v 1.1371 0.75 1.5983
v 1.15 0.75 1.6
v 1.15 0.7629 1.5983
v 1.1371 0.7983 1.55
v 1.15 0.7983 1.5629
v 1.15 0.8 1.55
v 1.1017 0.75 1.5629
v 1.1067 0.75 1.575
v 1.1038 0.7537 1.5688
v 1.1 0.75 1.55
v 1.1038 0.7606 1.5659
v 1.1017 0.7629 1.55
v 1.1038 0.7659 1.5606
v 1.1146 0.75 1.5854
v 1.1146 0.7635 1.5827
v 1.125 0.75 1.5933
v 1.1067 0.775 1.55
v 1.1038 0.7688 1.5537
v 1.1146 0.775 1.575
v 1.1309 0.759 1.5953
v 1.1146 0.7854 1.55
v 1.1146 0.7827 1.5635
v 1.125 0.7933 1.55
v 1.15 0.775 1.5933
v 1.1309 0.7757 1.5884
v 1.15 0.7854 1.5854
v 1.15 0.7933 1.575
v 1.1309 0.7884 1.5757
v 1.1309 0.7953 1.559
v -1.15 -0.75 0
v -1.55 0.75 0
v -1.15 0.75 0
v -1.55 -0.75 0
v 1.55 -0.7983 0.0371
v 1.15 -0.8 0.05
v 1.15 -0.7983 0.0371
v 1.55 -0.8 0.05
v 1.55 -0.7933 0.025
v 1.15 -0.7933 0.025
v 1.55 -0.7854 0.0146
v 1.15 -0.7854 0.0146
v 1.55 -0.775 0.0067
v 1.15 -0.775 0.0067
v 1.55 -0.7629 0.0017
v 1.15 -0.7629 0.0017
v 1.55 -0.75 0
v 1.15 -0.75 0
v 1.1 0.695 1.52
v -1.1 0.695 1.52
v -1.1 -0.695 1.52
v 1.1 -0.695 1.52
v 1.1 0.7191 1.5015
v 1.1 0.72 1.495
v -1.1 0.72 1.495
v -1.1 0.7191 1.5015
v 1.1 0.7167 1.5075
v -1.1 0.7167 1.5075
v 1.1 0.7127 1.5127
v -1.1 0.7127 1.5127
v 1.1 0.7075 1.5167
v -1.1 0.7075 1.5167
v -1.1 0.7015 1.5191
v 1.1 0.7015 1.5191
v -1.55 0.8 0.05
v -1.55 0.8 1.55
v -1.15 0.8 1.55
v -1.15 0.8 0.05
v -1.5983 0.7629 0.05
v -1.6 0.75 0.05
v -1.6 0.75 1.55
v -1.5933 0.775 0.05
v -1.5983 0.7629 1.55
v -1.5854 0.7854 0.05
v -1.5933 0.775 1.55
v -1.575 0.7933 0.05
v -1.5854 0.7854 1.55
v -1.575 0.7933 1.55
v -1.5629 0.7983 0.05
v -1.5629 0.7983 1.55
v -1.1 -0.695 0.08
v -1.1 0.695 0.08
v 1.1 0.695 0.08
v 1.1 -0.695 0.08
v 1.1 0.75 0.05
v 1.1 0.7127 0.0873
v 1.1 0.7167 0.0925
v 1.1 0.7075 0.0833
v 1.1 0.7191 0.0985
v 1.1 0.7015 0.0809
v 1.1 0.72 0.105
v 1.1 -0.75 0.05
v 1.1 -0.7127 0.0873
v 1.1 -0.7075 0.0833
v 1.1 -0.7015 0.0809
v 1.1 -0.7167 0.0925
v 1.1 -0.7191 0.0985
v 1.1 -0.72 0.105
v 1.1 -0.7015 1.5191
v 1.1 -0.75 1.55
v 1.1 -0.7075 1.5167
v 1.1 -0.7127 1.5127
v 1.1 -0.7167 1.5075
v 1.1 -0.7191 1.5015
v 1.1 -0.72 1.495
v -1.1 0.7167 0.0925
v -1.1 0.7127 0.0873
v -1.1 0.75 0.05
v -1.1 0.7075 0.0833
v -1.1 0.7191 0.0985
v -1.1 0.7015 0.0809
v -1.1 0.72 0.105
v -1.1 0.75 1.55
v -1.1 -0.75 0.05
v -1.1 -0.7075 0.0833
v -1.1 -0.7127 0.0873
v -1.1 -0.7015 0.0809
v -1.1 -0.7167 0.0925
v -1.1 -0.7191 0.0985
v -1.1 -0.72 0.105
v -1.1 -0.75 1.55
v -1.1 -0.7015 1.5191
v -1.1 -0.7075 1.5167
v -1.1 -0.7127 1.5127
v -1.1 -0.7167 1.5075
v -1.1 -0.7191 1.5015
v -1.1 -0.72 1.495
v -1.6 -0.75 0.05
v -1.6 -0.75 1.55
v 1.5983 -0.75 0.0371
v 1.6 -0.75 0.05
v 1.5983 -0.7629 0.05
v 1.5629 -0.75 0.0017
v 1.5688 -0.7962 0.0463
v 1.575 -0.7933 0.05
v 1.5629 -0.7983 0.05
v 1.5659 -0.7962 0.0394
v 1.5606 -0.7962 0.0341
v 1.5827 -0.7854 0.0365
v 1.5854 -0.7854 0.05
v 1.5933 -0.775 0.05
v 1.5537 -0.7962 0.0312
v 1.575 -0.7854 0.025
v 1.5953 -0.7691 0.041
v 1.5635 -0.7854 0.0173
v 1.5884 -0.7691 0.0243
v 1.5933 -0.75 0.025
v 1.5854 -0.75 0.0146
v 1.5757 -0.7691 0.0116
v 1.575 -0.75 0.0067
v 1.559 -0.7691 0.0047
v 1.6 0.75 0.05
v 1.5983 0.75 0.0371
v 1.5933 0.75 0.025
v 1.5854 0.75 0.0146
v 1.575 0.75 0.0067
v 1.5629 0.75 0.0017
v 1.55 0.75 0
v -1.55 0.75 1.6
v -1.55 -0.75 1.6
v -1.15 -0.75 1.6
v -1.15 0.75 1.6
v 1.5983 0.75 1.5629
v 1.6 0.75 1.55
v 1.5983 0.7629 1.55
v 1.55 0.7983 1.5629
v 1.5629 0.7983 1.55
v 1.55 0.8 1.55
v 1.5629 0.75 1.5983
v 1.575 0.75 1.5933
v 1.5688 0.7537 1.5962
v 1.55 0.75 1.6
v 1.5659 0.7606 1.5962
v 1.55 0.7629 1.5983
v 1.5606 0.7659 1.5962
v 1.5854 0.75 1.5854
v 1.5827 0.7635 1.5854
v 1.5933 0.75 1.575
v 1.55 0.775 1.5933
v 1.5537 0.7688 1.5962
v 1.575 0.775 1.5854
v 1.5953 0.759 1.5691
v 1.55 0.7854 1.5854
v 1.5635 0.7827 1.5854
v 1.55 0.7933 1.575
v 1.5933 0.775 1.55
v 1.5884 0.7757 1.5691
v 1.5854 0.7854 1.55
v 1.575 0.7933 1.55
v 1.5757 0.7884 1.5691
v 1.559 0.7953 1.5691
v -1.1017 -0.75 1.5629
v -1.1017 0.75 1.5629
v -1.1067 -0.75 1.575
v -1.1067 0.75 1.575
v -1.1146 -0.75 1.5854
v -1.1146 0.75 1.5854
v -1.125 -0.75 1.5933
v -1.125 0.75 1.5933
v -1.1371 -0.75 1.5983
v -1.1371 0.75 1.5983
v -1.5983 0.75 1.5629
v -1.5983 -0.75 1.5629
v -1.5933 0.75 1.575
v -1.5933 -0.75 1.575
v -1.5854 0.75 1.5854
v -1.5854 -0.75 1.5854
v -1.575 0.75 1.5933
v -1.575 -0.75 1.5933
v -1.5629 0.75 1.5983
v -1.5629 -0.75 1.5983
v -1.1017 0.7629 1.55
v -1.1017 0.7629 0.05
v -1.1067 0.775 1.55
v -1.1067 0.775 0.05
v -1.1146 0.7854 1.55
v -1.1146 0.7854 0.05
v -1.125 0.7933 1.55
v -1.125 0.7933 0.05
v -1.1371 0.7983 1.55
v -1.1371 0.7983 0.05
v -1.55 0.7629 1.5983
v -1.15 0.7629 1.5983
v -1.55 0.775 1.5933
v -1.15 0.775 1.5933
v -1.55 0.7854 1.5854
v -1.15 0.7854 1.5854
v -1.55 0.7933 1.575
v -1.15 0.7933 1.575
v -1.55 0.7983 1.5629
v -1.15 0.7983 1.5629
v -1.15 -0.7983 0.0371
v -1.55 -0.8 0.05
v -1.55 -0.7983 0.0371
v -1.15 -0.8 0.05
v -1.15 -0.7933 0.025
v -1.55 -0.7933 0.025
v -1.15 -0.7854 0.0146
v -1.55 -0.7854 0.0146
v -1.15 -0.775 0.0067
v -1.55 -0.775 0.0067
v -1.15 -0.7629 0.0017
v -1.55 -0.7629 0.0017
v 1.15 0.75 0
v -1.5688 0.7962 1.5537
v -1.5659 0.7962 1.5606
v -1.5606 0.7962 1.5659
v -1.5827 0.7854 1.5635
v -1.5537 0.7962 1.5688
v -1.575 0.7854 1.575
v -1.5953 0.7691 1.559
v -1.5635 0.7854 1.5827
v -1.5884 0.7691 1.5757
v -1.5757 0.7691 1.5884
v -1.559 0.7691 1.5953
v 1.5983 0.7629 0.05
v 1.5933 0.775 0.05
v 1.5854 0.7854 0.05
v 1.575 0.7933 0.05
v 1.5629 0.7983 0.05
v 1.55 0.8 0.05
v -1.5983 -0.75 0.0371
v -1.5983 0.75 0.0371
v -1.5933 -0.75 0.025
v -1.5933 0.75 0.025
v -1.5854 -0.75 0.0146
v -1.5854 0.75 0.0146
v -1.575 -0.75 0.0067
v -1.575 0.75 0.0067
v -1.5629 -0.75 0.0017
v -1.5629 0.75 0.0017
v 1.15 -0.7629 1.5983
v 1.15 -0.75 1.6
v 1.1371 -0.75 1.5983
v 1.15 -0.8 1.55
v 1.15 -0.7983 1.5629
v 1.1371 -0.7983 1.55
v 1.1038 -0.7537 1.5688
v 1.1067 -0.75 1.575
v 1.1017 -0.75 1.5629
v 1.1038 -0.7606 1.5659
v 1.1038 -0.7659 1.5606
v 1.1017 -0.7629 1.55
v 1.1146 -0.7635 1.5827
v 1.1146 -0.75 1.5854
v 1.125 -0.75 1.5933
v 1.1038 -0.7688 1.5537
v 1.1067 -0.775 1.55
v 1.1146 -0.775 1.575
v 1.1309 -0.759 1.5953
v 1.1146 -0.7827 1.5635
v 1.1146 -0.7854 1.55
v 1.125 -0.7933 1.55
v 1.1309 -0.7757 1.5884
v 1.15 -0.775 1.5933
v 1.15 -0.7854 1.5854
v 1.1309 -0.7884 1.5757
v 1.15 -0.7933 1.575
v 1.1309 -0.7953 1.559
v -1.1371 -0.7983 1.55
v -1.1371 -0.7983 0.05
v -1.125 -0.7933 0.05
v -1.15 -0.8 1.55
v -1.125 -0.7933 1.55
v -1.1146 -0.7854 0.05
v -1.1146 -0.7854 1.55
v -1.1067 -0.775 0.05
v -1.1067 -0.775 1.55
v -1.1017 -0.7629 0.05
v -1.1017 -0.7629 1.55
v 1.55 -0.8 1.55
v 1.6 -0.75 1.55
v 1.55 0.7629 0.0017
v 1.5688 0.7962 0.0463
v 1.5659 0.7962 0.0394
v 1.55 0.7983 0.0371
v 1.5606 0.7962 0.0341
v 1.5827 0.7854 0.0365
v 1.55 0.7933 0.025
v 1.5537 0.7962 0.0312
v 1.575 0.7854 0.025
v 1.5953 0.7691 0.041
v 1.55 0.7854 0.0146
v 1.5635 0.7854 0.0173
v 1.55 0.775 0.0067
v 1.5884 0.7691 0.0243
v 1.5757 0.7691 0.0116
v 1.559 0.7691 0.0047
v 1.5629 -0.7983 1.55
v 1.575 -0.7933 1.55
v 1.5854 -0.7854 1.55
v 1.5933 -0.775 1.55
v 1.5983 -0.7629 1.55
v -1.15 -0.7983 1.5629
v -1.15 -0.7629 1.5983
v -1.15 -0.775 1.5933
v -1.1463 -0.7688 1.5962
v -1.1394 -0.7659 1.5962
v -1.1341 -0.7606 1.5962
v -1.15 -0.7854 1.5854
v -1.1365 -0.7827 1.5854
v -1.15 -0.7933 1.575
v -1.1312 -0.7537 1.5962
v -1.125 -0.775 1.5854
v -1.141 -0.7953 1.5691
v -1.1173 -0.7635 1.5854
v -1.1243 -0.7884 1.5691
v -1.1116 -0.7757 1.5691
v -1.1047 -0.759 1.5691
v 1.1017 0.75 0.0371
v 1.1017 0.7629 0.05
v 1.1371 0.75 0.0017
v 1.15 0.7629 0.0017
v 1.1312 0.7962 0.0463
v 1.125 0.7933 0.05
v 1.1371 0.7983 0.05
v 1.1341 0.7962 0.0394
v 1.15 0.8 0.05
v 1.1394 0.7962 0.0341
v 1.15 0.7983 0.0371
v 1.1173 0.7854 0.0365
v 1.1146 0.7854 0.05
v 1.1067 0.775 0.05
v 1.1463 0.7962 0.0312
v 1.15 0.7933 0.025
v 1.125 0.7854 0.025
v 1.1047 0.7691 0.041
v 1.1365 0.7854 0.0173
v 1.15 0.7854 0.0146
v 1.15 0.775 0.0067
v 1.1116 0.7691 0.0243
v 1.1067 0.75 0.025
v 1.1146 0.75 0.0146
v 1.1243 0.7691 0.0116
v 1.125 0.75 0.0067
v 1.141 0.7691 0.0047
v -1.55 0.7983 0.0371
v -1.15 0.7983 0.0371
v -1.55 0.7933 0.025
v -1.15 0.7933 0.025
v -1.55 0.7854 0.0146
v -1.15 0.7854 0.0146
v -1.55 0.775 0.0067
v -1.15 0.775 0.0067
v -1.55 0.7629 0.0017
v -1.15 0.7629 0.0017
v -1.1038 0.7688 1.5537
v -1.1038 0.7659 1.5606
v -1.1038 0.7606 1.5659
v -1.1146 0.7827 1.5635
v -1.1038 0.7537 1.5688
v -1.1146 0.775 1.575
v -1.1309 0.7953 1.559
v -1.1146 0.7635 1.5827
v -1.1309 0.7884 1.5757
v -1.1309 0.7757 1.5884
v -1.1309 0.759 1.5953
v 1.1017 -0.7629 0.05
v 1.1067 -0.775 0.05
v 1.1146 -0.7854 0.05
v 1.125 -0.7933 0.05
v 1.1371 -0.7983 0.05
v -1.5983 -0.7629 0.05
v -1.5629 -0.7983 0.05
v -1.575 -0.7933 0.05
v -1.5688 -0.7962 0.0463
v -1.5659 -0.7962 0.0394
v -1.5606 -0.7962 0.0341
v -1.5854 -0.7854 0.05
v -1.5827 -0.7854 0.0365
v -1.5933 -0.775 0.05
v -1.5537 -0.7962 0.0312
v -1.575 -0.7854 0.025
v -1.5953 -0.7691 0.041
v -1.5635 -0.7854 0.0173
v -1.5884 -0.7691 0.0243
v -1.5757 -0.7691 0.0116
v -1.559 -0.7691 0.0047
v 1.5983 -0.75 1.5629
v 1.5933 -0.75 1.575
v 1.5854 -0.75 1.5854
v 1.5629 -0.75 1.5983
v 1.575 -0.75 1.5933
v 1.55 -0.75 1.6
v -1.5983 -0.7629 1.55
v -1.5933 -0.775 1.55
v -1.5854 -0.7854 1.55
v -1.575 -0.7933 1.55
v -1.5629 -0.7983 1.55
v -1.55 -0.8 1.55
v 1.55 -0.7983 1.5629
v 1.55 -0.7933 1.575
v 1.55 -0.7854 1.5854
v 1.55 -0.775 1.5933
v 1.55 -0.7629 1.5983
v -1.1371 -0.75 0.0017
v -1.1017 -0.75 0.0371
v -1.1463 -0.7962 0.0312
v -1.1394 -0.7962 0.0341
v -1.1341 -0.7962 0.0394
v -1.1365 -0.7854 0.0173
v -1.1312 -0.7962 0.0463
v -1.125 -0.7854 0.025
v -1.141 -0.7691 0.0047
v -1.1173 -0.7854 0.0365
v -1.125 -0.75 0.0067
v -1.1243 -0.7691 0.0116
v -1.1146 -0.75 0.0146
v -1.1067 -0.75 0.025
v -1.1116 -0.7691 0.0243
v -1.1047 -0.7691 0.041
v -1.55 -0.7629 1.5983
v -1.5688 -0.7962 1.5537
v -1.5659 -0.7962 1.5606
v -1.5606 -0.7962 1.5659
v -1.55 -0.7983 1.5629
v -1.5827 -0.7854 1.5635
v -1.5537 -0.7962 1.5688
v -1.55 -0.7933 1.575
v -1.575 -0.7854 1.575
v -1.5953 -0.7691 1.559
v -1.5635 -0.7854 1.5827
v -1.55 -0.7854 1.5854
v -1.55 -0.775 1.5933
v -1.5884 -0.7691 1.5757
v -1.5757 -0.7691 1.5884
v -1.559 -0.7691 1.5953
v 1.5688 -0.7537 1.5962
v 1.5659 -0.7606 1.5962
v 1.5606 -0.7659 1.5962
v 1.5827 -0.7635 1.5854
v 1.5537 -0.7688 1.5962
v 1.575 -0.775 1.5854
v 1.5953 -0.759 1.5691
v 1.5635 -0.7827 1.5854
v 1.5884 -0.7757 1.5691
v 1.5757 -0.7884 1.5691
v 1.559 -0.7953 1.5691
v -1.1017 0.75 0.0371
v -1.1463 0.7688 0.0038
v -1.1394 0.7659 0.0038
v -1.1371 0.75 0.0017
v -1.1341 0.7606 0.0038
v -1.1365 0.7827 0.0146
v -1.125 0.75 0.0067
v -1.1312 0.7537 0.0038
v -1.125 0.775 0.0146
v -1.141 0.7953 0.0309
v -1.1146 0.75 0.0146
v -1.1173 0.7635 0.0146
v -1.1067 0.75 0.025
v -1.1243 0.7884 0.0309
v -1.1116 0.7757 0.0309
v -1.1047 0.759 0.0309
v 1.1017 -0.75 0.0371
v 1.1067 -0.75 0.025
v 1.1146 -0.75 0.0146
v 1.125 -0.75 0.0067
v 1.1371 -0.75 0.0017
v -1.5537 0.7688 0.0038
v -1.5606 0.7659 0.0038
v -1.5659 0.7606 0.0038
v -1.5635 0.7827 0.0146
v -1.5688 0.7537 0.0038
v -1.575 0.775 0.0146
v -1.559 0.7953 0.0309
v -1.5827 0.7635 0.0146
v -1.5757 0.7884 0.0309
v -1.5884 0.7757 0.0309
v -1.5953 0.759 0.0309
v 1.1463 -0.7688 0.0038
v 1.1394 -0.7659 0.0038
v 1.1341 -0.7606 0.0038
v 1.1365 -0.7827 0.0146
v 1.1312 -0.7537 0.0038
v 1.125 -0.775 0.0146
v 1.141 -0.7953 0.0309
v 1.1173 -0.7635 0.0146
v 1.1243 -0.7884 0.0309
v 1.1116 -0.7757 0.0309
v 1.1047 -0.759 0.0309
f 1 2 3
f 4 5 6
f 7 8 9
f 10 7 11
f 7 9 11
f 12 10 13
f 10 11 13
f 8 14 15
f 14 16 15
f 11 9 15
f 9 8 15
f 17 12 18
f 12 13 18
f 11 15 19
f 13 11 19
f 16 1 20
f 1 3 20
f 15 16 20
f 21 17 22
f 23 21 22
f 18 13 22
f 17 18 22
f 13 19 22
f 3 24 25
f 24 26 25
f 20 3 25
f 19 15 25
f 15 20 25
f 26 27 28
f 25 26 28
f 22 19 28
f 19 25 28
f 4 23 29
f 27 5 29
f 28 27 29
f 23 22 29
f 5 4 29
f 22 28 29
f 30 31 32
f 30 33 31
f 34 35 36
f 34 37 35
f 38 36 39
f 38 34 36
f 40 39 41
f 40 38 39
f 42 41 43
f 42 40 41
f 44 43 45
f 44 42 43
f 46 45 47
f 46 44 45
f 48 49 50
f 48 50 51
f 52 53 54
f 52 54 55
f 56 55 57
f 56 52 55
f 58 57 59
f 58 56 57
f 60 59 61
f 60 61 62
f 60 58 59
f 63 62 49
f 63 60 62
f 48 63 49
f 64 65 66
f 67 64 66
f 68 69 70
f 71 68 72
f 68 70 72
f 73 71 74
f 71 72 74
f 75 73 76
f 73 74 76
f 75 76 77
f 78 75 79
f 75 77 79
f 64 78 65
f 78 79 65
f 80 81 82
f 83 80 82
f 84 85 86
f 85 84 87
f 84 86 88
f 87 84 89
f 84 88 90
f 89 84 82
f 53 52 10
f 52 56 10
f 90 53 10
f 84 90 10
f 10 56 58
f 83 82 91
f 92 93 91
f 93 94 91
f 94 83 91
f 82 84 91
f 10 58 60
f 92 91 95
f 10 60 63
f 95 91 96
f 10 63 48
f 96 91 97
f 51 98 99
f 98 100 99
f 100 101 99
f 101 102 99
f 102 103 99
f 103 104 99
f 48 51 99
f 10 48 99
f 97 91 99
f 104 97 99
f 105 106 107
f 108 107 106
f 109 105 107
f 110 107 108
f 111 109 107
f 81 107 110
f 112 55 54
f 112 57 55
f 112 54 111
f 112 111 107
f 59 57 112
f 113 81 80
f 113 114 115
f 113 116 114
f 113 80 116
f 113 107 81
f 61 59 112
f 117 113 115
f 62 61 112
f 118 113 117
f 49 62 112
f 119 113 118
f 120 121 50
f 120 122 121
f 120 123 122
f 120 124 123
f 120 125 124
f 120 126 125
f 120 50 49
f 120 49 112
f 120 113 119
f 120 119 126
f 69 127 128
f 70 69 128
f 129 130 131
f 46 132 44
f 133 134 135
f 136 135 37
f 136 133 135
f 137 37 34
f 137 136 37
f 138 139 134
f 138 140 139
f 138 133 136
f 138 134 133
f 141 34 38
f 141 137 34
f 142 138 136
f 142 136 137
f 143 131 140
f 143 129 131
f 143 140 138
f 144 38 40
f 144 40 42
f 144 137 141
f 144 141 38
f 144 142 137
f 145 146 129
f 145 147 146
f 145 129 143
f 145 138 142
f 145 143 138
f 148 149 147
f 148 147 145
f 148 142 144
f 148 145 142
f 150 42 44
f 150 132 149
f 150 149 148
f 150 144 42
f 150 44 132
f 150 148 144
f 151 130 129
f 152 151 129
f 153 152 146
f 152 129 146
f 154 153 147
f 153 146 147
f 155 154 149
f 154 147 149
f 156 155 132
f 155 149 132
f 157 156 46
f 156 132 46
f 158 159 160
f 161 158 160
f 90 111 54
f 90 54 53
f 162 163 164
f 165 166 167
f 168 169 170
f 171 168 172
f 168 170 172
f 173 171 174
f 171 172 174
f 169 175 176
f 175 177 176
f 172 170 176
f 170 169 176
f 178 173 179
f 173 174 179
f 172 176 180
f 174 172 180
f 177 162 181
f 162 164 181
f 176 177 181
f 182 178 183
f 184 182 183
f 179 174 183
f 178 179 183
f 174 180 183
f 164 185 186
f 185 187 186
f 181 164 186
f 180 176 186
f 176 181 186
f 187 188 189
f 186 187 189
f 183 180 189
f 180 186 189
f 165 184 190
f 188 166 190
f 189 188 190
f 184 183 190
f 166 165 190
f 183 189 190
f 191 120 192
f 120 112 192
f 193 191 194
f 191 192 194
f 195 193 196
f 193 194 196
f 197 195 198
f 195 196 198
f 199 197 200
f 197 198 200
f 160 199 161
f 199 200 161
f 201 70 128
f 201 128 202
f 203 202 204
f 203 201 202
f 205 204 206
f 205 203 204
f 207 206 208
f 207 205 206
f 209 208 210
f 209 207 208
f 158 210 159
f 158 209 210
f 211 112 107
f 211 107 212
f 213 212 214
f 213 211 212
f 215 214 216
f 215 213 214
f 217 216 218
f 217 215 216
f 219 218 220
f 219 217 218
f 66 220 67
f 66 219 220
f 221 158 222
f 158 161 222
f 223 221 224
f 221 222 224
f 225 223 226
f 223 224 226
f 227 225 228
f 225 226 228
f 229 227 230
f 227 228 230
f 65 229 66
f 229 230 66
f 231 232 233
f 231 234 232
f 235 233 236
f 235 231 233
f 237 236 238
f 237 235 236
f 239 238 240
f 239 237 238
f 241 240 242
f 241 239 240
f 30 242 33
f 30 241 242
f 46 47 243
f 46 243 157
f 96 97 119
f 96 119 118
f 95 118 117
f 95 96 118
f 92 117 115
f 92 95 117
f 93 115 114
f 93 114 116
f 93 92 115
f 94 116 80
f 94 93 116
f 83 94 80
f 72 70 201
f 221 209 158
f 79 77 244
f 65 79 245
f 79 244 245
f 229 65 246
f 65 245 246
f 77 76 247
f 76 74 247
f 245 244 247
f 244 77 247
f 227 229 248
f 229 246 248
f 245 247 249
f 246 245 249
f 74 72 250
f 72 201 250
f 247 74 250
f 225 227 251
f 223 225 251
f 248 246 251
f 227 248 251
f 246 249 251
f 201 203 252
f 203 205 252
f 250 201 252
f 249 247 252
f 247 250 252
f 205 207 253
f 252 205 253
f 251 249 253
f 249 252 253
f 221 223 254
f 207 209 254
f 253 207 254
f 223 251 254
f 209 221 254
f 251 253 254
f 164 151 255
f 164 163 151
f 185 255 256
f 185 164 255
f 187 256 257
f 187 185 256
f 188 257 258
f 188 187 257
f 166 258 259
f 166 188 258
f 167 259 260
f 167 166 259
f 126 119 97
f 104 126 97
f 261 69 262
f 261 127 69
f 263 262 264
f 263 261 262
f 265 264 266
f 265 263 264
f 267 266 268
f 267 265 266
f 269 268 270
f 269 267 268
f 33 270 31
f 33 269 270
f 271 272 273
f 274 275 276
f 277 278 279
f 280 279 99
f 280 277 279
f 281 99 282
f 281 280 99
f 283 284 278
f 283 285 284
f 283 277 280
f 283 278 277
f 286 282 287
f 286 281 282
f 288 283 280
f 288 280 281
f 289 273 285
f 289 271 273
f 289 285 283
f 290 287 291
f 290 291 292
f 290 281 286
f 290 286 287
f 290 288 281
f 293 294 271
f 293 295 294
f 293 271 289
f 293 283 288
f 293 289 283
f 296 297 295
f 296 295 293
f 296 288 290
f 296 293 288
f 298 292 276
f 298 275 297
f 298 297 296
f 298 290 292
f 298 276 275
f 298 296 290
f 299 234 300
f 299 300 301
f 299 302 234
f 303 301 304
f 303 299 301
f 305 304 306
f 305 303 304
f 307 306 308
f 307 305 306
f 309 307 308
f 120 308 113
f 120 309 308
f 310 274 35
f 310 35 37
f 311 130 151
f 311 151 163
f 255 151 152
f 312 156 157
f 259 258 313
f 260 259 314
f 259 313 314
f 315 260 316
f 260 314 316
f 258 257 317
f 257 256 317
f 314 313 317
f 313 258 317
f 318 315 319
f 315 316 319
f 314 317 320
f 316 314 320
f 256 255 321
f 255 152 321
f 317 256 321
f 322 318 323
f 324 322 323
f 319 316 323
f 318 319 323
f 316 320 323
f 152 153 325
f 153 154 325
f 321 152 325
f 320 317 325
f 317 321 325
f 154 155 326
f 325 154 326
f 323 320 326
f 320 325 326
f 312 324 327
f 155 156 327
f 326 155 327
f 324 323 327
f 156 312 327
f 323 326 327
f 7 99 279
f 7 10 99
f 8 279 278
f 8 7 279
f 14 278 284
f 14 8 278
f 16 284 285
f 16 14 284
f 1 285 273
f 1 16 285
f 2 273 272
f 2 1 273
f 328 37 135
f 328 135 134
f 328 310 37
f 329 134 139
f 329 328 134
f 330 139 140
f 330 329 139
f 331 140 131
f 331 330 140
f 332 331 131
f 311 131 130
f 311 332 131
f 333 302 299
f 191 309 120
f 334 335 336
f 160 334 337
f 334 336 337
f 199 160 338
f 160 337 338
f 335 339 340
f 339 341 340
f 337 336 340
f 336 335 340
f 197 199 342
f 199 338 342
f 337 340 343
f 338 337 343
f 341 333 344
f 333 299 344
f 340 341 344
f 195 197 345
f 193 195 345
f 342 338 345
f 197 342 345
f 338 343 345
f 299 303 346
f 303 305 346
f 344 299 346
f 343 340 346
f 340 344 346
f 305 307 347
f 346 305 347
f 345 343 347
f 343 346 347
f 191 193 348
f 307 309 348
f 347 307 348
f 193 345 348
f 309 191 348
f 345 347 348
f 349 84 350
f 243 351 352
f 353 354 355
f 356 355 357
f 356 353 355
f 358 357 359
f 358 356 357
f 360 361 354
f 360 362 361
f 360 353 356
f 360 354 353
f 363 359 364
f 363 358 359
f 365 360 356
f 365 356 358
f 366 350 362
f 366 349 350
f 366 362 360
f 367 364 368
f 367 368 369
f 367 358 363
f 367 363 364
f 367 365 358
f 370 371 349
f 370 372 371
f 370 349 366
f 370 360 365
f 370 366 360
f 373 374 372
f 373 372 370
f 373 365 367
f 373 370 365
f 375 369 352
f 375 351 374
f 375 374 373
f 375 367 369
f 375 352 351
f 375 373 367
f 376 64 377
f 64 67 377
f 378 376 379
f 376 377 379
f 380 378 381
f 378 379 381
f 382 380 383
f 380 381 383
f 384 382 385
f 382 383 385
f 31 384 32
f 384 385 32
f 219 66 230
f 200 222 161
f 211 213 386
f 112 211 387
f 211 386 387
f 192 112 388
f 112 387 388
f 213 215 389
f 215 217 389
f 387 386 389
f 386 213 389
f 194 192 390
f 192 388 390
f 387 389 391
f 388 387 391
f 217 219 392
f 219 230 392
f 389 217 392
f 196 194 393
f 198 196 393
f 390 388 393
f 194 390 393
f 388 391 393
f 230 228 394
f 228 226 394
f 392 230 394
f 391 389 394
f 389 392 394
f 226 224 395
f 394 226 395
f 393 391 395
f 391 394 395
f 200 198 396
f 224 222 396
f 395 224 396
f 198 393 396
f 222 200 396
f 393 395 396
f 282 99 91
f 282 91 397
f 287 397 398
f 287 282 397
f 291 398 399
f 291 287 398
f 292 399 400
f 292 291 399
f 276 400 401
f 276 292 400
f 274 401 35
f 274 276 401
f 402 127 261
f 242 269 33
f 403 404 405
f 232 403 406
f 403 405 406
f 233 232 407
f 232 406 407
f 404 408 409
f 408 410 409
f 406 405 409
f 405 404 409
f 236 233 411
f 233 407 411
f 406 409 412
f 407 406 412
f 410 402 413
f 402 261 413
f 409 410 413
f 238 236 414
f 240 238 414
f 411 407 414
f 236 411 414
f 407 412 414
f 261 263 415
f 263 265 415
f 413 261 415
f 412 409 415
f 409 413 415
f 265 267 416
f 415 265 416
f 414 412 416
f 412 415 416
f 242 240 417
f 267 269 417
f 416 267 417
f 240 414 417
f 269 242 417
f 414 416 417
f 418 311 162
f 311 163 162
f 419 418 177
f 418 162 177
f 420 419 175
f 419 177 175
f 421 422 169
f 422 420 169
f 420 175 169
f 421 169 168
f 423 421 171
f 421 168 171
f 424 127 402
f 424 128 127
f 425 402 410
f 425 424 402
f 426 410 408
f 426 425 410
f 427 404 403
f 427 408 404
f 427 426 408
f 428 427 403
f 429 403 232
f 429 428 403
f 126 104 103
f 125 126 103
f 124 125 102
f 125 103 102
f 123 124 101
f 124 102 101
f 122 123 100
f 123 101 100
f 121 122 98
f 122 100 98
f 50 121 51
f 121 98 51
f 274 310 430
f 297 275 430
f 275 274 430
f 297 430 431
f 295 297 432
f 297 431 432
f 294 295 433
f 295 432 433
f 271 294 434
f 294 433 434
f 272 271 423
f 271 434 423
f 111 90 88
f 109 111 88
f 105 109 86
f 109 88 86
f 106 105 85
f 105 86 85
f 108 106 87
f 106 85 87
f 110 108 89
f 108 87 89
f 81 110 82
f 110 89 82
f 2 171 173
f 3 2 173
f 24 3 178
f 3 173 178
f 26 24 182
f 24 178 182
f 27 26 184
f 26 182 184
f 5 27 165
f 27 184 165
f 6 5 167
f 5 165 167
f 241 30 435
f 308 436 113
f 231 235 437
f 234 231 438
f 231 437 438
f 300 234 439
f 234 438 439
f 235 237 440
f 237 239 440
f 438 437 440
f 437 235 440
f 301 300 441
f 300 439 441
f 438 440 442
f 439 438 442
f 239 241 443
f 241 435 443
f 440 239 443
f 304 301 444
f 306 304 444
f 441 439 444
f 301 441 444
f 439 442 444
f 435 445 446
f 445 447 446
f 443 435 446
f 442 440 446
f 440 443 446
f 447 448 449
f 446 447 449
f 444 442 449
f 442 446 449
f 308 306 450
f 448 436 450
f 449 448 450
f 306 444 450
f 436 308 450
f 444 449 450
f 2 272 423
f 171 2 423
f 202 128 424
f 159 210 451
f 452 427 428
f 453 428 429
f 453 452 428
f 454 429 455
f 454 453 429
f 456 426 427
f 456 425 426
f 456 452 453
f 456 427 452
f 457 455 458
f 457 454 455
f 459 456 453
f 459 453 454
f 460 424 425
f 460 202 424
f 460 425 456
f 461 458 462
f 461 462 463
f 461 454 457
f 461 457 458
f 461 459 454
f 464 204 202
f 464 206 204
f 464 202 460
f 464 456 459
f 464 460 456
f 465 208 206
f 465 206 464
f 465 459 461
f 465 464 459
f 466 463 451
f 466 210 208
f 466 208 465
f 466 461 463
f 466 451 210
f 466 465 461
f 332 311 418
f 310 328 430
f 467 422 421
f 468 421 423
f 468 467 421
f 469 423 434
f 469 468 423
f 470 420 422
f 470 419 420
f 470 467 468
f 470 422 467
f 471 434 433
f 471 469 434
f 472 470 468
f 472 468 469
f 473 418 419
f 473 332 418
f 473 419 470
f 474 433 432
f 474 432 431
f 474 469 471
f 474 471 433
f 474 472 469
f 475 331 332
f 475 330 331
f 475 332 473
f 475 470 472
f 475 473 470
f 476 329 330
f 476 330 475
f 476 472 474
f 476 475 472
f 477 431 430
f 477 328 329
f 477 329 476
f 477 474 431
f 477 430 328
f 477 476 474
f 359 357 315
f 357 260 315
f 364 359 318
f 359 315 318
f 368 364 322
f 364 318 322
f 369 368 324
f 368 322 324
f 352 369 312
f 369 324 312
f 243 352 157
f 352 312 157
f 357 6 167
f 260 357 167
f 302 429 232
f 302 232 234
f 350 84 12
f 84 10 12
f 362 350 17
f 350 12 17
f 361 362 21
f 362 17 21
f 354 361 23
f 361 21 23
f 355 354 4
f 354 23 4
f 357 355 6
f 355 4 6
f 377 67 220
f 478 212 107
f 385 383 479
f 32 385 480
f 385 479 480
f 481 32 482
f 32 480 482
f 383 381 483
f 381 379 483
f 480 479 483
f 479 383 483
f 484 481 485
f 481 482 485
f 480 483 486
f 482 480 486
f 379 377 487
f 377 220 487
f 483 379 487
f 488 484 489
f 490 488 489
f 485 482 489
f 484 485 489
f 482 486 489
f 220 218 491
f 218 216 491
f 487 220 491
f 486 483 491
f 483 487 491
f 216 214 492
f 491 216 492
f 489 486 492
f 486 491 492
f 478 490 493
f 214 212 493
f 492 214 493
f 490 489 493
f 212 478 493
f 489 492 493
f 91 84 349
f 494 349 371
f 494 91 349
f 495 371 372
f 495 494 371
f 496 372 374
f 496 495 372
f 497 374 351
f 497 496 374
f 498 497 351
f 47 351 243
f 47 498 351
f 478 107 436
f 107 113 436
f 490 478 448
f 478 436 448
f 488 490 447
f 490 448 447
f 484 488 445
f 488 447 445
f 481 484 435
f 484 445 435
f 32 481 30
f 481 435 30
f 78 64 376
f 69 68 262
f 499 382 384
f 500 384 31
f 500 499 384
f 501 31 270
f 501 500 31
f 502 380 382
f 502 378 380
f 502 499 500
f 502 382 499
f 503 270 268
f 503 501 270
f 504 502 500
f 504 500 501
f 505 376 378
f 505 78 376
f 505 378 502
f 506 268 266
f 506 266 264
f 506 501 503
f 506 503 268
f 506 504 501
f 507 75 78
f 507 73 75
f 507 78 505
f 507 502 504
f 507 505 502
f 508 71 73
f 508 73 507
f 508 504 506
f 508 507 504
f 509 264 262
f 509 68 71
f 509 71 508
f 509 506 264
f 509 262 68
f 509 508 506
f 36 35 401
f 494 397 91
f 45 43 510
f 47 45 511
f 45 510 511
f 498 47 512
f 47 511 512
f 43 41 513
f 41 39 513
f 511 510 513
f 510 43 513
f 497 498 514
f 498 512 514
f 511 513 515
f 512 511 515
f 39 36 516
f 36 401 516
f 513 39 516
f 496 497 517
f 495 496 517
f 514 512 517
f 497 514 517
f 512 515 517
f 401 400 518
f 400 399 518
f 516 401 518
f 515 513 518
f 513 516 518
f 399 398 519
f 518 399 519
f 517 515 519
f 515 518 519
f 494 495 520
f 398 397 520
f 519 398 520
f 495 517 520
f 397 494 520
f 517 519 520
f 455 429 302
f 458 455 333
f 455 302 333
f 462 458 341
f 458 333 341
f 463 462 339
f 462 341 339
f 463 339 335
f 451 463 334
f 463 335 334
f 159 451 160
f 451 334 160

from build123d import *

# Parameters (mm, degrees)
SKETCH001_W  = 0.5
SKETCH001_H  = 1.6
PAD001_DEPTH = 0.8
FILLET_R     = 0.05
SKETCH002_W  = 0.5
SKETCH002_H  = 1.6
PAD002_DEPTH = 0.8
FILLET001_R  = 0.05
SKETCH_W     = 2.88
SKETCH_H     = 1.44
PAD_DEPTH    = 1.44
FILLET002_R  = 0.025


with BuildPart() as body001:
    # Sketch001 → Pad001 (new body, symmetric)
    with BuildSketch(Plane.XZ):
        with Locations((-1.35, 0.8)):
            Rectangle(SKETCH001_W, SKETCH001_H)
    extrude(amount=PAD001_DEPTH, both=True)

    # Fillet
    fillet_edges = [body001.edges().sort_by_distance(p)[0] for p in [
        (-1.6, 0, 1.6),
        (-1.6, 0.8, 0.8),
        (-1.35, 0.8, 1.6),
        (-1.1, 0.8, 0.8),
        (-1.35, 0.8, 0),
        (-1.1, 0, 0),
        (-1.6, 0, 0),
        (-1.6, -0.8, 0.8),
        (-1.35, -0.8, 0),
        (-1.1, -0.8, 0.8),
        (-1.35, -0.8, 1.6),
        (-1.1, 0, 1.6),
    ]]
    fillet(fillet_edges, radius=FILLET_R)


with BuildPart() as body002:
    # Sketch002 → Pad002 (new body, symmetric)
    with BuildSketch(Plane.XZ):
        with Locations((1.35, 0.8)):
            Rectangle(SKETCH002_W, SKETCH002_H)
    extrude(amount=PAD002_DEPTH, both=True)

    # Fillet001
    fillet001_edges = [body002.edges().sort_by_distance(p)[0] for p in [
        (1.6, 0, 0),
        (1.6, 0.8, 0.8),
        (1.6, -0.8, 0.8),
        (1.6, 0, 1.6),
        (1.35, -0.8, 1.6),
        (1.35, 0.8, 1.6),
        (1.1, 0, 1.6),
        (1.1, -0.8, 0.8),
        (1.35, -0.8, 0),
        (1.1, 0, 0),
        (1.1, 0.8, 0.8),
        (1.35, 0.8, 0),
    ]]
    fillet(fillet001_edges, radius=FILLET001_R)


with BuildPart() as fusion:
    # Sketch → Pad (new body)
    with BuildSketch(Plane.XY.offset(0.08)):
        Rectangle(SKETCH_W, SKETCH_H)
    extrude(amount=PAD_DEPTH)

    # Fillet002
    fillet002_edges = [fusion.edges().sort_by_distance(p)[0] for p in [
        (0, -0.72, 1.52),
        (0, 0.72, 1.52),
        (0, -0.72, 0.08),
        (0, 0.72, 0.08),
    ]]
    fillet(fillet002_edges, radius=FILLET002_R)

    # Fusion: union Body001, Body002
    add(body001.part)
    add(body002.part)


solid = fusion.part
